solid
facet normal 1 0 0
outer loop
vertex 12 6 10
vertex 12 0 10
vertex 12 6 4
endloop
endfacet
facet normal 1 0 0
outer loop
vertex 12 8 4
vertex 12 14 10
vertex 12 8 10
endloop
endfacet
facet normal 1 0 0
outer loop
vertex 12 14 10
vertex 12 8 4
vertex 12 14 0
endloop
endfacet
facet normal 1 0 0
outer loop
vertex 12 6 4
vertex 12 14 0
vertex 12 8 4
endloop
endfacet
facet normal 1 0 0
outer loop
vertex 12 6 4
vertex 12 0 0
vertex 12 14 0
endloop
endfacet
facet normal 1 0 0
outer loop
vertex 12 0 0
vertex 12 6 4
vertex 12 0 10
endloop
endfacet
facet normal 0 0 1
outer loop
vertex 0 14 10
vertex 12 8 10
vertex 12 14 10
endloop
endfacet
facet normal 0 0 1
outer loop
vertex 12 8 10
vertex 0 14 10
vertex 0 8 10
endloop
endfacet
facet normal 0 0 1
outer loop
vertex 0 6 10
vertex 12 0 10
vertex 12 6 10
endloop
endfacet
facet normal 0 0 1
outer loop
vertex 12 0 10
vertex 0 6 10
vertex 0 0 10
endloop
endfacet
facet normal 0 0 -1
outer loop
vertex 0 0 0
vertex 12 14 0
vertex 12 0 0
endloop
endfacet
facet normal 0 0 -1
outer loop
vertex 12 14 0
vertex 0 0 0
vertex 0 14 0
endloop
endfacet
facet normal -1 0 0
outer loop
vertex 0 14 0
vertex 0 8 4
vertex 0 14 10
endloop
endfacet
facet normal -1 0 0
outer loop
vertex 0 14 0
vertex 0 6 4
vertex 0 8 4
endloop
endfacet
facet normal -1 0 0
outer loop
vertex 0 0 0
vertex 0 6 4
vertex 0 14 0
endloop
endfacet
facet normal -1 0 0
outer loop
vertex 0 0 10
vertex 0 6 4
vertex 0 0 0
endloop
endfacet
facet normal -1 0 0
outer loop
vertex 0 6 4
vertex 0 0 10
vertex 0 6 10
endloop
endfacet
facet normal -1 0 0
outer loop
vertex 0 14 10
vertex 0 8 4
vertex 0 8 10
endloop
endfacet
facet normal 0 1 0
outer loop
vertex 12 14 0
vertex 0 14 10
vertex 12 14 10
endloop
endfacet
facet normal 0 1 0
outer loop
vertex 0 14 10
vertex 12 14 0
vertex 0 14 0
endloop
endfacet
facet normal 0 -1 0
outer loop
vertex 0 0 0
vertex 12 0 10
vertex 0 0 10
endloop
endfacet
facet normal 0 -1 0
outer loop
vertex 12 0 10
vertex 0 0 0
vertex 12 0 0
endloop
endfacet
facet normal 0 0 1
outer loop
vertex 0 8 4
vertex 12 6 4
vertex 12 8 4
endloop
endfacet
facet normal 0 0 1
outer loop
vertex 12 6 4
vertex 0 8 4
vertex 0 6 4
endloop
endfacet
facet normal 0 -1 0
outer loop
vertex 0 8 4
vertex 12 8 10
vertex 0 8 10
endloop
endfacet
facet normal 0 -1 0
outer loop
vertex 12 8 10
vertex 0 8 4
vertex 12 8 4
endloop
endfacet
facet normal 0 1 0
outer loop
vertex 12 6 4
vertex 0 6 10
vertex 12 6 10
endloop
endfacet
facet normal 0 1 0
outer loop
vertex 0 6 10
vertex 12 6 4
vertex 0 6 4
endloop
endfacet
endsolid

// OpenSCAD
$fn = 32;

// ----------------------------------------------------------------------
// Micro clip: slotted block, 5-20 mm class
// ----------------------------------------------------------------------

// --- parameters (mm) ---
block_l = 12;             // block length, X
block_w = 14;             // block width, Y
block_h = 10;             // block height, Z
slot_w = 2;               // slot width
slot_d = 6;               // slot depth from the top

difference() {
  cube([block_l, block_w, block_h]);
  translate([-1, block_w / 2 - slot_w / 2, block_h - slot_d])
    cube([block_l + 2, slot_w, slot_d + 1]);
}
